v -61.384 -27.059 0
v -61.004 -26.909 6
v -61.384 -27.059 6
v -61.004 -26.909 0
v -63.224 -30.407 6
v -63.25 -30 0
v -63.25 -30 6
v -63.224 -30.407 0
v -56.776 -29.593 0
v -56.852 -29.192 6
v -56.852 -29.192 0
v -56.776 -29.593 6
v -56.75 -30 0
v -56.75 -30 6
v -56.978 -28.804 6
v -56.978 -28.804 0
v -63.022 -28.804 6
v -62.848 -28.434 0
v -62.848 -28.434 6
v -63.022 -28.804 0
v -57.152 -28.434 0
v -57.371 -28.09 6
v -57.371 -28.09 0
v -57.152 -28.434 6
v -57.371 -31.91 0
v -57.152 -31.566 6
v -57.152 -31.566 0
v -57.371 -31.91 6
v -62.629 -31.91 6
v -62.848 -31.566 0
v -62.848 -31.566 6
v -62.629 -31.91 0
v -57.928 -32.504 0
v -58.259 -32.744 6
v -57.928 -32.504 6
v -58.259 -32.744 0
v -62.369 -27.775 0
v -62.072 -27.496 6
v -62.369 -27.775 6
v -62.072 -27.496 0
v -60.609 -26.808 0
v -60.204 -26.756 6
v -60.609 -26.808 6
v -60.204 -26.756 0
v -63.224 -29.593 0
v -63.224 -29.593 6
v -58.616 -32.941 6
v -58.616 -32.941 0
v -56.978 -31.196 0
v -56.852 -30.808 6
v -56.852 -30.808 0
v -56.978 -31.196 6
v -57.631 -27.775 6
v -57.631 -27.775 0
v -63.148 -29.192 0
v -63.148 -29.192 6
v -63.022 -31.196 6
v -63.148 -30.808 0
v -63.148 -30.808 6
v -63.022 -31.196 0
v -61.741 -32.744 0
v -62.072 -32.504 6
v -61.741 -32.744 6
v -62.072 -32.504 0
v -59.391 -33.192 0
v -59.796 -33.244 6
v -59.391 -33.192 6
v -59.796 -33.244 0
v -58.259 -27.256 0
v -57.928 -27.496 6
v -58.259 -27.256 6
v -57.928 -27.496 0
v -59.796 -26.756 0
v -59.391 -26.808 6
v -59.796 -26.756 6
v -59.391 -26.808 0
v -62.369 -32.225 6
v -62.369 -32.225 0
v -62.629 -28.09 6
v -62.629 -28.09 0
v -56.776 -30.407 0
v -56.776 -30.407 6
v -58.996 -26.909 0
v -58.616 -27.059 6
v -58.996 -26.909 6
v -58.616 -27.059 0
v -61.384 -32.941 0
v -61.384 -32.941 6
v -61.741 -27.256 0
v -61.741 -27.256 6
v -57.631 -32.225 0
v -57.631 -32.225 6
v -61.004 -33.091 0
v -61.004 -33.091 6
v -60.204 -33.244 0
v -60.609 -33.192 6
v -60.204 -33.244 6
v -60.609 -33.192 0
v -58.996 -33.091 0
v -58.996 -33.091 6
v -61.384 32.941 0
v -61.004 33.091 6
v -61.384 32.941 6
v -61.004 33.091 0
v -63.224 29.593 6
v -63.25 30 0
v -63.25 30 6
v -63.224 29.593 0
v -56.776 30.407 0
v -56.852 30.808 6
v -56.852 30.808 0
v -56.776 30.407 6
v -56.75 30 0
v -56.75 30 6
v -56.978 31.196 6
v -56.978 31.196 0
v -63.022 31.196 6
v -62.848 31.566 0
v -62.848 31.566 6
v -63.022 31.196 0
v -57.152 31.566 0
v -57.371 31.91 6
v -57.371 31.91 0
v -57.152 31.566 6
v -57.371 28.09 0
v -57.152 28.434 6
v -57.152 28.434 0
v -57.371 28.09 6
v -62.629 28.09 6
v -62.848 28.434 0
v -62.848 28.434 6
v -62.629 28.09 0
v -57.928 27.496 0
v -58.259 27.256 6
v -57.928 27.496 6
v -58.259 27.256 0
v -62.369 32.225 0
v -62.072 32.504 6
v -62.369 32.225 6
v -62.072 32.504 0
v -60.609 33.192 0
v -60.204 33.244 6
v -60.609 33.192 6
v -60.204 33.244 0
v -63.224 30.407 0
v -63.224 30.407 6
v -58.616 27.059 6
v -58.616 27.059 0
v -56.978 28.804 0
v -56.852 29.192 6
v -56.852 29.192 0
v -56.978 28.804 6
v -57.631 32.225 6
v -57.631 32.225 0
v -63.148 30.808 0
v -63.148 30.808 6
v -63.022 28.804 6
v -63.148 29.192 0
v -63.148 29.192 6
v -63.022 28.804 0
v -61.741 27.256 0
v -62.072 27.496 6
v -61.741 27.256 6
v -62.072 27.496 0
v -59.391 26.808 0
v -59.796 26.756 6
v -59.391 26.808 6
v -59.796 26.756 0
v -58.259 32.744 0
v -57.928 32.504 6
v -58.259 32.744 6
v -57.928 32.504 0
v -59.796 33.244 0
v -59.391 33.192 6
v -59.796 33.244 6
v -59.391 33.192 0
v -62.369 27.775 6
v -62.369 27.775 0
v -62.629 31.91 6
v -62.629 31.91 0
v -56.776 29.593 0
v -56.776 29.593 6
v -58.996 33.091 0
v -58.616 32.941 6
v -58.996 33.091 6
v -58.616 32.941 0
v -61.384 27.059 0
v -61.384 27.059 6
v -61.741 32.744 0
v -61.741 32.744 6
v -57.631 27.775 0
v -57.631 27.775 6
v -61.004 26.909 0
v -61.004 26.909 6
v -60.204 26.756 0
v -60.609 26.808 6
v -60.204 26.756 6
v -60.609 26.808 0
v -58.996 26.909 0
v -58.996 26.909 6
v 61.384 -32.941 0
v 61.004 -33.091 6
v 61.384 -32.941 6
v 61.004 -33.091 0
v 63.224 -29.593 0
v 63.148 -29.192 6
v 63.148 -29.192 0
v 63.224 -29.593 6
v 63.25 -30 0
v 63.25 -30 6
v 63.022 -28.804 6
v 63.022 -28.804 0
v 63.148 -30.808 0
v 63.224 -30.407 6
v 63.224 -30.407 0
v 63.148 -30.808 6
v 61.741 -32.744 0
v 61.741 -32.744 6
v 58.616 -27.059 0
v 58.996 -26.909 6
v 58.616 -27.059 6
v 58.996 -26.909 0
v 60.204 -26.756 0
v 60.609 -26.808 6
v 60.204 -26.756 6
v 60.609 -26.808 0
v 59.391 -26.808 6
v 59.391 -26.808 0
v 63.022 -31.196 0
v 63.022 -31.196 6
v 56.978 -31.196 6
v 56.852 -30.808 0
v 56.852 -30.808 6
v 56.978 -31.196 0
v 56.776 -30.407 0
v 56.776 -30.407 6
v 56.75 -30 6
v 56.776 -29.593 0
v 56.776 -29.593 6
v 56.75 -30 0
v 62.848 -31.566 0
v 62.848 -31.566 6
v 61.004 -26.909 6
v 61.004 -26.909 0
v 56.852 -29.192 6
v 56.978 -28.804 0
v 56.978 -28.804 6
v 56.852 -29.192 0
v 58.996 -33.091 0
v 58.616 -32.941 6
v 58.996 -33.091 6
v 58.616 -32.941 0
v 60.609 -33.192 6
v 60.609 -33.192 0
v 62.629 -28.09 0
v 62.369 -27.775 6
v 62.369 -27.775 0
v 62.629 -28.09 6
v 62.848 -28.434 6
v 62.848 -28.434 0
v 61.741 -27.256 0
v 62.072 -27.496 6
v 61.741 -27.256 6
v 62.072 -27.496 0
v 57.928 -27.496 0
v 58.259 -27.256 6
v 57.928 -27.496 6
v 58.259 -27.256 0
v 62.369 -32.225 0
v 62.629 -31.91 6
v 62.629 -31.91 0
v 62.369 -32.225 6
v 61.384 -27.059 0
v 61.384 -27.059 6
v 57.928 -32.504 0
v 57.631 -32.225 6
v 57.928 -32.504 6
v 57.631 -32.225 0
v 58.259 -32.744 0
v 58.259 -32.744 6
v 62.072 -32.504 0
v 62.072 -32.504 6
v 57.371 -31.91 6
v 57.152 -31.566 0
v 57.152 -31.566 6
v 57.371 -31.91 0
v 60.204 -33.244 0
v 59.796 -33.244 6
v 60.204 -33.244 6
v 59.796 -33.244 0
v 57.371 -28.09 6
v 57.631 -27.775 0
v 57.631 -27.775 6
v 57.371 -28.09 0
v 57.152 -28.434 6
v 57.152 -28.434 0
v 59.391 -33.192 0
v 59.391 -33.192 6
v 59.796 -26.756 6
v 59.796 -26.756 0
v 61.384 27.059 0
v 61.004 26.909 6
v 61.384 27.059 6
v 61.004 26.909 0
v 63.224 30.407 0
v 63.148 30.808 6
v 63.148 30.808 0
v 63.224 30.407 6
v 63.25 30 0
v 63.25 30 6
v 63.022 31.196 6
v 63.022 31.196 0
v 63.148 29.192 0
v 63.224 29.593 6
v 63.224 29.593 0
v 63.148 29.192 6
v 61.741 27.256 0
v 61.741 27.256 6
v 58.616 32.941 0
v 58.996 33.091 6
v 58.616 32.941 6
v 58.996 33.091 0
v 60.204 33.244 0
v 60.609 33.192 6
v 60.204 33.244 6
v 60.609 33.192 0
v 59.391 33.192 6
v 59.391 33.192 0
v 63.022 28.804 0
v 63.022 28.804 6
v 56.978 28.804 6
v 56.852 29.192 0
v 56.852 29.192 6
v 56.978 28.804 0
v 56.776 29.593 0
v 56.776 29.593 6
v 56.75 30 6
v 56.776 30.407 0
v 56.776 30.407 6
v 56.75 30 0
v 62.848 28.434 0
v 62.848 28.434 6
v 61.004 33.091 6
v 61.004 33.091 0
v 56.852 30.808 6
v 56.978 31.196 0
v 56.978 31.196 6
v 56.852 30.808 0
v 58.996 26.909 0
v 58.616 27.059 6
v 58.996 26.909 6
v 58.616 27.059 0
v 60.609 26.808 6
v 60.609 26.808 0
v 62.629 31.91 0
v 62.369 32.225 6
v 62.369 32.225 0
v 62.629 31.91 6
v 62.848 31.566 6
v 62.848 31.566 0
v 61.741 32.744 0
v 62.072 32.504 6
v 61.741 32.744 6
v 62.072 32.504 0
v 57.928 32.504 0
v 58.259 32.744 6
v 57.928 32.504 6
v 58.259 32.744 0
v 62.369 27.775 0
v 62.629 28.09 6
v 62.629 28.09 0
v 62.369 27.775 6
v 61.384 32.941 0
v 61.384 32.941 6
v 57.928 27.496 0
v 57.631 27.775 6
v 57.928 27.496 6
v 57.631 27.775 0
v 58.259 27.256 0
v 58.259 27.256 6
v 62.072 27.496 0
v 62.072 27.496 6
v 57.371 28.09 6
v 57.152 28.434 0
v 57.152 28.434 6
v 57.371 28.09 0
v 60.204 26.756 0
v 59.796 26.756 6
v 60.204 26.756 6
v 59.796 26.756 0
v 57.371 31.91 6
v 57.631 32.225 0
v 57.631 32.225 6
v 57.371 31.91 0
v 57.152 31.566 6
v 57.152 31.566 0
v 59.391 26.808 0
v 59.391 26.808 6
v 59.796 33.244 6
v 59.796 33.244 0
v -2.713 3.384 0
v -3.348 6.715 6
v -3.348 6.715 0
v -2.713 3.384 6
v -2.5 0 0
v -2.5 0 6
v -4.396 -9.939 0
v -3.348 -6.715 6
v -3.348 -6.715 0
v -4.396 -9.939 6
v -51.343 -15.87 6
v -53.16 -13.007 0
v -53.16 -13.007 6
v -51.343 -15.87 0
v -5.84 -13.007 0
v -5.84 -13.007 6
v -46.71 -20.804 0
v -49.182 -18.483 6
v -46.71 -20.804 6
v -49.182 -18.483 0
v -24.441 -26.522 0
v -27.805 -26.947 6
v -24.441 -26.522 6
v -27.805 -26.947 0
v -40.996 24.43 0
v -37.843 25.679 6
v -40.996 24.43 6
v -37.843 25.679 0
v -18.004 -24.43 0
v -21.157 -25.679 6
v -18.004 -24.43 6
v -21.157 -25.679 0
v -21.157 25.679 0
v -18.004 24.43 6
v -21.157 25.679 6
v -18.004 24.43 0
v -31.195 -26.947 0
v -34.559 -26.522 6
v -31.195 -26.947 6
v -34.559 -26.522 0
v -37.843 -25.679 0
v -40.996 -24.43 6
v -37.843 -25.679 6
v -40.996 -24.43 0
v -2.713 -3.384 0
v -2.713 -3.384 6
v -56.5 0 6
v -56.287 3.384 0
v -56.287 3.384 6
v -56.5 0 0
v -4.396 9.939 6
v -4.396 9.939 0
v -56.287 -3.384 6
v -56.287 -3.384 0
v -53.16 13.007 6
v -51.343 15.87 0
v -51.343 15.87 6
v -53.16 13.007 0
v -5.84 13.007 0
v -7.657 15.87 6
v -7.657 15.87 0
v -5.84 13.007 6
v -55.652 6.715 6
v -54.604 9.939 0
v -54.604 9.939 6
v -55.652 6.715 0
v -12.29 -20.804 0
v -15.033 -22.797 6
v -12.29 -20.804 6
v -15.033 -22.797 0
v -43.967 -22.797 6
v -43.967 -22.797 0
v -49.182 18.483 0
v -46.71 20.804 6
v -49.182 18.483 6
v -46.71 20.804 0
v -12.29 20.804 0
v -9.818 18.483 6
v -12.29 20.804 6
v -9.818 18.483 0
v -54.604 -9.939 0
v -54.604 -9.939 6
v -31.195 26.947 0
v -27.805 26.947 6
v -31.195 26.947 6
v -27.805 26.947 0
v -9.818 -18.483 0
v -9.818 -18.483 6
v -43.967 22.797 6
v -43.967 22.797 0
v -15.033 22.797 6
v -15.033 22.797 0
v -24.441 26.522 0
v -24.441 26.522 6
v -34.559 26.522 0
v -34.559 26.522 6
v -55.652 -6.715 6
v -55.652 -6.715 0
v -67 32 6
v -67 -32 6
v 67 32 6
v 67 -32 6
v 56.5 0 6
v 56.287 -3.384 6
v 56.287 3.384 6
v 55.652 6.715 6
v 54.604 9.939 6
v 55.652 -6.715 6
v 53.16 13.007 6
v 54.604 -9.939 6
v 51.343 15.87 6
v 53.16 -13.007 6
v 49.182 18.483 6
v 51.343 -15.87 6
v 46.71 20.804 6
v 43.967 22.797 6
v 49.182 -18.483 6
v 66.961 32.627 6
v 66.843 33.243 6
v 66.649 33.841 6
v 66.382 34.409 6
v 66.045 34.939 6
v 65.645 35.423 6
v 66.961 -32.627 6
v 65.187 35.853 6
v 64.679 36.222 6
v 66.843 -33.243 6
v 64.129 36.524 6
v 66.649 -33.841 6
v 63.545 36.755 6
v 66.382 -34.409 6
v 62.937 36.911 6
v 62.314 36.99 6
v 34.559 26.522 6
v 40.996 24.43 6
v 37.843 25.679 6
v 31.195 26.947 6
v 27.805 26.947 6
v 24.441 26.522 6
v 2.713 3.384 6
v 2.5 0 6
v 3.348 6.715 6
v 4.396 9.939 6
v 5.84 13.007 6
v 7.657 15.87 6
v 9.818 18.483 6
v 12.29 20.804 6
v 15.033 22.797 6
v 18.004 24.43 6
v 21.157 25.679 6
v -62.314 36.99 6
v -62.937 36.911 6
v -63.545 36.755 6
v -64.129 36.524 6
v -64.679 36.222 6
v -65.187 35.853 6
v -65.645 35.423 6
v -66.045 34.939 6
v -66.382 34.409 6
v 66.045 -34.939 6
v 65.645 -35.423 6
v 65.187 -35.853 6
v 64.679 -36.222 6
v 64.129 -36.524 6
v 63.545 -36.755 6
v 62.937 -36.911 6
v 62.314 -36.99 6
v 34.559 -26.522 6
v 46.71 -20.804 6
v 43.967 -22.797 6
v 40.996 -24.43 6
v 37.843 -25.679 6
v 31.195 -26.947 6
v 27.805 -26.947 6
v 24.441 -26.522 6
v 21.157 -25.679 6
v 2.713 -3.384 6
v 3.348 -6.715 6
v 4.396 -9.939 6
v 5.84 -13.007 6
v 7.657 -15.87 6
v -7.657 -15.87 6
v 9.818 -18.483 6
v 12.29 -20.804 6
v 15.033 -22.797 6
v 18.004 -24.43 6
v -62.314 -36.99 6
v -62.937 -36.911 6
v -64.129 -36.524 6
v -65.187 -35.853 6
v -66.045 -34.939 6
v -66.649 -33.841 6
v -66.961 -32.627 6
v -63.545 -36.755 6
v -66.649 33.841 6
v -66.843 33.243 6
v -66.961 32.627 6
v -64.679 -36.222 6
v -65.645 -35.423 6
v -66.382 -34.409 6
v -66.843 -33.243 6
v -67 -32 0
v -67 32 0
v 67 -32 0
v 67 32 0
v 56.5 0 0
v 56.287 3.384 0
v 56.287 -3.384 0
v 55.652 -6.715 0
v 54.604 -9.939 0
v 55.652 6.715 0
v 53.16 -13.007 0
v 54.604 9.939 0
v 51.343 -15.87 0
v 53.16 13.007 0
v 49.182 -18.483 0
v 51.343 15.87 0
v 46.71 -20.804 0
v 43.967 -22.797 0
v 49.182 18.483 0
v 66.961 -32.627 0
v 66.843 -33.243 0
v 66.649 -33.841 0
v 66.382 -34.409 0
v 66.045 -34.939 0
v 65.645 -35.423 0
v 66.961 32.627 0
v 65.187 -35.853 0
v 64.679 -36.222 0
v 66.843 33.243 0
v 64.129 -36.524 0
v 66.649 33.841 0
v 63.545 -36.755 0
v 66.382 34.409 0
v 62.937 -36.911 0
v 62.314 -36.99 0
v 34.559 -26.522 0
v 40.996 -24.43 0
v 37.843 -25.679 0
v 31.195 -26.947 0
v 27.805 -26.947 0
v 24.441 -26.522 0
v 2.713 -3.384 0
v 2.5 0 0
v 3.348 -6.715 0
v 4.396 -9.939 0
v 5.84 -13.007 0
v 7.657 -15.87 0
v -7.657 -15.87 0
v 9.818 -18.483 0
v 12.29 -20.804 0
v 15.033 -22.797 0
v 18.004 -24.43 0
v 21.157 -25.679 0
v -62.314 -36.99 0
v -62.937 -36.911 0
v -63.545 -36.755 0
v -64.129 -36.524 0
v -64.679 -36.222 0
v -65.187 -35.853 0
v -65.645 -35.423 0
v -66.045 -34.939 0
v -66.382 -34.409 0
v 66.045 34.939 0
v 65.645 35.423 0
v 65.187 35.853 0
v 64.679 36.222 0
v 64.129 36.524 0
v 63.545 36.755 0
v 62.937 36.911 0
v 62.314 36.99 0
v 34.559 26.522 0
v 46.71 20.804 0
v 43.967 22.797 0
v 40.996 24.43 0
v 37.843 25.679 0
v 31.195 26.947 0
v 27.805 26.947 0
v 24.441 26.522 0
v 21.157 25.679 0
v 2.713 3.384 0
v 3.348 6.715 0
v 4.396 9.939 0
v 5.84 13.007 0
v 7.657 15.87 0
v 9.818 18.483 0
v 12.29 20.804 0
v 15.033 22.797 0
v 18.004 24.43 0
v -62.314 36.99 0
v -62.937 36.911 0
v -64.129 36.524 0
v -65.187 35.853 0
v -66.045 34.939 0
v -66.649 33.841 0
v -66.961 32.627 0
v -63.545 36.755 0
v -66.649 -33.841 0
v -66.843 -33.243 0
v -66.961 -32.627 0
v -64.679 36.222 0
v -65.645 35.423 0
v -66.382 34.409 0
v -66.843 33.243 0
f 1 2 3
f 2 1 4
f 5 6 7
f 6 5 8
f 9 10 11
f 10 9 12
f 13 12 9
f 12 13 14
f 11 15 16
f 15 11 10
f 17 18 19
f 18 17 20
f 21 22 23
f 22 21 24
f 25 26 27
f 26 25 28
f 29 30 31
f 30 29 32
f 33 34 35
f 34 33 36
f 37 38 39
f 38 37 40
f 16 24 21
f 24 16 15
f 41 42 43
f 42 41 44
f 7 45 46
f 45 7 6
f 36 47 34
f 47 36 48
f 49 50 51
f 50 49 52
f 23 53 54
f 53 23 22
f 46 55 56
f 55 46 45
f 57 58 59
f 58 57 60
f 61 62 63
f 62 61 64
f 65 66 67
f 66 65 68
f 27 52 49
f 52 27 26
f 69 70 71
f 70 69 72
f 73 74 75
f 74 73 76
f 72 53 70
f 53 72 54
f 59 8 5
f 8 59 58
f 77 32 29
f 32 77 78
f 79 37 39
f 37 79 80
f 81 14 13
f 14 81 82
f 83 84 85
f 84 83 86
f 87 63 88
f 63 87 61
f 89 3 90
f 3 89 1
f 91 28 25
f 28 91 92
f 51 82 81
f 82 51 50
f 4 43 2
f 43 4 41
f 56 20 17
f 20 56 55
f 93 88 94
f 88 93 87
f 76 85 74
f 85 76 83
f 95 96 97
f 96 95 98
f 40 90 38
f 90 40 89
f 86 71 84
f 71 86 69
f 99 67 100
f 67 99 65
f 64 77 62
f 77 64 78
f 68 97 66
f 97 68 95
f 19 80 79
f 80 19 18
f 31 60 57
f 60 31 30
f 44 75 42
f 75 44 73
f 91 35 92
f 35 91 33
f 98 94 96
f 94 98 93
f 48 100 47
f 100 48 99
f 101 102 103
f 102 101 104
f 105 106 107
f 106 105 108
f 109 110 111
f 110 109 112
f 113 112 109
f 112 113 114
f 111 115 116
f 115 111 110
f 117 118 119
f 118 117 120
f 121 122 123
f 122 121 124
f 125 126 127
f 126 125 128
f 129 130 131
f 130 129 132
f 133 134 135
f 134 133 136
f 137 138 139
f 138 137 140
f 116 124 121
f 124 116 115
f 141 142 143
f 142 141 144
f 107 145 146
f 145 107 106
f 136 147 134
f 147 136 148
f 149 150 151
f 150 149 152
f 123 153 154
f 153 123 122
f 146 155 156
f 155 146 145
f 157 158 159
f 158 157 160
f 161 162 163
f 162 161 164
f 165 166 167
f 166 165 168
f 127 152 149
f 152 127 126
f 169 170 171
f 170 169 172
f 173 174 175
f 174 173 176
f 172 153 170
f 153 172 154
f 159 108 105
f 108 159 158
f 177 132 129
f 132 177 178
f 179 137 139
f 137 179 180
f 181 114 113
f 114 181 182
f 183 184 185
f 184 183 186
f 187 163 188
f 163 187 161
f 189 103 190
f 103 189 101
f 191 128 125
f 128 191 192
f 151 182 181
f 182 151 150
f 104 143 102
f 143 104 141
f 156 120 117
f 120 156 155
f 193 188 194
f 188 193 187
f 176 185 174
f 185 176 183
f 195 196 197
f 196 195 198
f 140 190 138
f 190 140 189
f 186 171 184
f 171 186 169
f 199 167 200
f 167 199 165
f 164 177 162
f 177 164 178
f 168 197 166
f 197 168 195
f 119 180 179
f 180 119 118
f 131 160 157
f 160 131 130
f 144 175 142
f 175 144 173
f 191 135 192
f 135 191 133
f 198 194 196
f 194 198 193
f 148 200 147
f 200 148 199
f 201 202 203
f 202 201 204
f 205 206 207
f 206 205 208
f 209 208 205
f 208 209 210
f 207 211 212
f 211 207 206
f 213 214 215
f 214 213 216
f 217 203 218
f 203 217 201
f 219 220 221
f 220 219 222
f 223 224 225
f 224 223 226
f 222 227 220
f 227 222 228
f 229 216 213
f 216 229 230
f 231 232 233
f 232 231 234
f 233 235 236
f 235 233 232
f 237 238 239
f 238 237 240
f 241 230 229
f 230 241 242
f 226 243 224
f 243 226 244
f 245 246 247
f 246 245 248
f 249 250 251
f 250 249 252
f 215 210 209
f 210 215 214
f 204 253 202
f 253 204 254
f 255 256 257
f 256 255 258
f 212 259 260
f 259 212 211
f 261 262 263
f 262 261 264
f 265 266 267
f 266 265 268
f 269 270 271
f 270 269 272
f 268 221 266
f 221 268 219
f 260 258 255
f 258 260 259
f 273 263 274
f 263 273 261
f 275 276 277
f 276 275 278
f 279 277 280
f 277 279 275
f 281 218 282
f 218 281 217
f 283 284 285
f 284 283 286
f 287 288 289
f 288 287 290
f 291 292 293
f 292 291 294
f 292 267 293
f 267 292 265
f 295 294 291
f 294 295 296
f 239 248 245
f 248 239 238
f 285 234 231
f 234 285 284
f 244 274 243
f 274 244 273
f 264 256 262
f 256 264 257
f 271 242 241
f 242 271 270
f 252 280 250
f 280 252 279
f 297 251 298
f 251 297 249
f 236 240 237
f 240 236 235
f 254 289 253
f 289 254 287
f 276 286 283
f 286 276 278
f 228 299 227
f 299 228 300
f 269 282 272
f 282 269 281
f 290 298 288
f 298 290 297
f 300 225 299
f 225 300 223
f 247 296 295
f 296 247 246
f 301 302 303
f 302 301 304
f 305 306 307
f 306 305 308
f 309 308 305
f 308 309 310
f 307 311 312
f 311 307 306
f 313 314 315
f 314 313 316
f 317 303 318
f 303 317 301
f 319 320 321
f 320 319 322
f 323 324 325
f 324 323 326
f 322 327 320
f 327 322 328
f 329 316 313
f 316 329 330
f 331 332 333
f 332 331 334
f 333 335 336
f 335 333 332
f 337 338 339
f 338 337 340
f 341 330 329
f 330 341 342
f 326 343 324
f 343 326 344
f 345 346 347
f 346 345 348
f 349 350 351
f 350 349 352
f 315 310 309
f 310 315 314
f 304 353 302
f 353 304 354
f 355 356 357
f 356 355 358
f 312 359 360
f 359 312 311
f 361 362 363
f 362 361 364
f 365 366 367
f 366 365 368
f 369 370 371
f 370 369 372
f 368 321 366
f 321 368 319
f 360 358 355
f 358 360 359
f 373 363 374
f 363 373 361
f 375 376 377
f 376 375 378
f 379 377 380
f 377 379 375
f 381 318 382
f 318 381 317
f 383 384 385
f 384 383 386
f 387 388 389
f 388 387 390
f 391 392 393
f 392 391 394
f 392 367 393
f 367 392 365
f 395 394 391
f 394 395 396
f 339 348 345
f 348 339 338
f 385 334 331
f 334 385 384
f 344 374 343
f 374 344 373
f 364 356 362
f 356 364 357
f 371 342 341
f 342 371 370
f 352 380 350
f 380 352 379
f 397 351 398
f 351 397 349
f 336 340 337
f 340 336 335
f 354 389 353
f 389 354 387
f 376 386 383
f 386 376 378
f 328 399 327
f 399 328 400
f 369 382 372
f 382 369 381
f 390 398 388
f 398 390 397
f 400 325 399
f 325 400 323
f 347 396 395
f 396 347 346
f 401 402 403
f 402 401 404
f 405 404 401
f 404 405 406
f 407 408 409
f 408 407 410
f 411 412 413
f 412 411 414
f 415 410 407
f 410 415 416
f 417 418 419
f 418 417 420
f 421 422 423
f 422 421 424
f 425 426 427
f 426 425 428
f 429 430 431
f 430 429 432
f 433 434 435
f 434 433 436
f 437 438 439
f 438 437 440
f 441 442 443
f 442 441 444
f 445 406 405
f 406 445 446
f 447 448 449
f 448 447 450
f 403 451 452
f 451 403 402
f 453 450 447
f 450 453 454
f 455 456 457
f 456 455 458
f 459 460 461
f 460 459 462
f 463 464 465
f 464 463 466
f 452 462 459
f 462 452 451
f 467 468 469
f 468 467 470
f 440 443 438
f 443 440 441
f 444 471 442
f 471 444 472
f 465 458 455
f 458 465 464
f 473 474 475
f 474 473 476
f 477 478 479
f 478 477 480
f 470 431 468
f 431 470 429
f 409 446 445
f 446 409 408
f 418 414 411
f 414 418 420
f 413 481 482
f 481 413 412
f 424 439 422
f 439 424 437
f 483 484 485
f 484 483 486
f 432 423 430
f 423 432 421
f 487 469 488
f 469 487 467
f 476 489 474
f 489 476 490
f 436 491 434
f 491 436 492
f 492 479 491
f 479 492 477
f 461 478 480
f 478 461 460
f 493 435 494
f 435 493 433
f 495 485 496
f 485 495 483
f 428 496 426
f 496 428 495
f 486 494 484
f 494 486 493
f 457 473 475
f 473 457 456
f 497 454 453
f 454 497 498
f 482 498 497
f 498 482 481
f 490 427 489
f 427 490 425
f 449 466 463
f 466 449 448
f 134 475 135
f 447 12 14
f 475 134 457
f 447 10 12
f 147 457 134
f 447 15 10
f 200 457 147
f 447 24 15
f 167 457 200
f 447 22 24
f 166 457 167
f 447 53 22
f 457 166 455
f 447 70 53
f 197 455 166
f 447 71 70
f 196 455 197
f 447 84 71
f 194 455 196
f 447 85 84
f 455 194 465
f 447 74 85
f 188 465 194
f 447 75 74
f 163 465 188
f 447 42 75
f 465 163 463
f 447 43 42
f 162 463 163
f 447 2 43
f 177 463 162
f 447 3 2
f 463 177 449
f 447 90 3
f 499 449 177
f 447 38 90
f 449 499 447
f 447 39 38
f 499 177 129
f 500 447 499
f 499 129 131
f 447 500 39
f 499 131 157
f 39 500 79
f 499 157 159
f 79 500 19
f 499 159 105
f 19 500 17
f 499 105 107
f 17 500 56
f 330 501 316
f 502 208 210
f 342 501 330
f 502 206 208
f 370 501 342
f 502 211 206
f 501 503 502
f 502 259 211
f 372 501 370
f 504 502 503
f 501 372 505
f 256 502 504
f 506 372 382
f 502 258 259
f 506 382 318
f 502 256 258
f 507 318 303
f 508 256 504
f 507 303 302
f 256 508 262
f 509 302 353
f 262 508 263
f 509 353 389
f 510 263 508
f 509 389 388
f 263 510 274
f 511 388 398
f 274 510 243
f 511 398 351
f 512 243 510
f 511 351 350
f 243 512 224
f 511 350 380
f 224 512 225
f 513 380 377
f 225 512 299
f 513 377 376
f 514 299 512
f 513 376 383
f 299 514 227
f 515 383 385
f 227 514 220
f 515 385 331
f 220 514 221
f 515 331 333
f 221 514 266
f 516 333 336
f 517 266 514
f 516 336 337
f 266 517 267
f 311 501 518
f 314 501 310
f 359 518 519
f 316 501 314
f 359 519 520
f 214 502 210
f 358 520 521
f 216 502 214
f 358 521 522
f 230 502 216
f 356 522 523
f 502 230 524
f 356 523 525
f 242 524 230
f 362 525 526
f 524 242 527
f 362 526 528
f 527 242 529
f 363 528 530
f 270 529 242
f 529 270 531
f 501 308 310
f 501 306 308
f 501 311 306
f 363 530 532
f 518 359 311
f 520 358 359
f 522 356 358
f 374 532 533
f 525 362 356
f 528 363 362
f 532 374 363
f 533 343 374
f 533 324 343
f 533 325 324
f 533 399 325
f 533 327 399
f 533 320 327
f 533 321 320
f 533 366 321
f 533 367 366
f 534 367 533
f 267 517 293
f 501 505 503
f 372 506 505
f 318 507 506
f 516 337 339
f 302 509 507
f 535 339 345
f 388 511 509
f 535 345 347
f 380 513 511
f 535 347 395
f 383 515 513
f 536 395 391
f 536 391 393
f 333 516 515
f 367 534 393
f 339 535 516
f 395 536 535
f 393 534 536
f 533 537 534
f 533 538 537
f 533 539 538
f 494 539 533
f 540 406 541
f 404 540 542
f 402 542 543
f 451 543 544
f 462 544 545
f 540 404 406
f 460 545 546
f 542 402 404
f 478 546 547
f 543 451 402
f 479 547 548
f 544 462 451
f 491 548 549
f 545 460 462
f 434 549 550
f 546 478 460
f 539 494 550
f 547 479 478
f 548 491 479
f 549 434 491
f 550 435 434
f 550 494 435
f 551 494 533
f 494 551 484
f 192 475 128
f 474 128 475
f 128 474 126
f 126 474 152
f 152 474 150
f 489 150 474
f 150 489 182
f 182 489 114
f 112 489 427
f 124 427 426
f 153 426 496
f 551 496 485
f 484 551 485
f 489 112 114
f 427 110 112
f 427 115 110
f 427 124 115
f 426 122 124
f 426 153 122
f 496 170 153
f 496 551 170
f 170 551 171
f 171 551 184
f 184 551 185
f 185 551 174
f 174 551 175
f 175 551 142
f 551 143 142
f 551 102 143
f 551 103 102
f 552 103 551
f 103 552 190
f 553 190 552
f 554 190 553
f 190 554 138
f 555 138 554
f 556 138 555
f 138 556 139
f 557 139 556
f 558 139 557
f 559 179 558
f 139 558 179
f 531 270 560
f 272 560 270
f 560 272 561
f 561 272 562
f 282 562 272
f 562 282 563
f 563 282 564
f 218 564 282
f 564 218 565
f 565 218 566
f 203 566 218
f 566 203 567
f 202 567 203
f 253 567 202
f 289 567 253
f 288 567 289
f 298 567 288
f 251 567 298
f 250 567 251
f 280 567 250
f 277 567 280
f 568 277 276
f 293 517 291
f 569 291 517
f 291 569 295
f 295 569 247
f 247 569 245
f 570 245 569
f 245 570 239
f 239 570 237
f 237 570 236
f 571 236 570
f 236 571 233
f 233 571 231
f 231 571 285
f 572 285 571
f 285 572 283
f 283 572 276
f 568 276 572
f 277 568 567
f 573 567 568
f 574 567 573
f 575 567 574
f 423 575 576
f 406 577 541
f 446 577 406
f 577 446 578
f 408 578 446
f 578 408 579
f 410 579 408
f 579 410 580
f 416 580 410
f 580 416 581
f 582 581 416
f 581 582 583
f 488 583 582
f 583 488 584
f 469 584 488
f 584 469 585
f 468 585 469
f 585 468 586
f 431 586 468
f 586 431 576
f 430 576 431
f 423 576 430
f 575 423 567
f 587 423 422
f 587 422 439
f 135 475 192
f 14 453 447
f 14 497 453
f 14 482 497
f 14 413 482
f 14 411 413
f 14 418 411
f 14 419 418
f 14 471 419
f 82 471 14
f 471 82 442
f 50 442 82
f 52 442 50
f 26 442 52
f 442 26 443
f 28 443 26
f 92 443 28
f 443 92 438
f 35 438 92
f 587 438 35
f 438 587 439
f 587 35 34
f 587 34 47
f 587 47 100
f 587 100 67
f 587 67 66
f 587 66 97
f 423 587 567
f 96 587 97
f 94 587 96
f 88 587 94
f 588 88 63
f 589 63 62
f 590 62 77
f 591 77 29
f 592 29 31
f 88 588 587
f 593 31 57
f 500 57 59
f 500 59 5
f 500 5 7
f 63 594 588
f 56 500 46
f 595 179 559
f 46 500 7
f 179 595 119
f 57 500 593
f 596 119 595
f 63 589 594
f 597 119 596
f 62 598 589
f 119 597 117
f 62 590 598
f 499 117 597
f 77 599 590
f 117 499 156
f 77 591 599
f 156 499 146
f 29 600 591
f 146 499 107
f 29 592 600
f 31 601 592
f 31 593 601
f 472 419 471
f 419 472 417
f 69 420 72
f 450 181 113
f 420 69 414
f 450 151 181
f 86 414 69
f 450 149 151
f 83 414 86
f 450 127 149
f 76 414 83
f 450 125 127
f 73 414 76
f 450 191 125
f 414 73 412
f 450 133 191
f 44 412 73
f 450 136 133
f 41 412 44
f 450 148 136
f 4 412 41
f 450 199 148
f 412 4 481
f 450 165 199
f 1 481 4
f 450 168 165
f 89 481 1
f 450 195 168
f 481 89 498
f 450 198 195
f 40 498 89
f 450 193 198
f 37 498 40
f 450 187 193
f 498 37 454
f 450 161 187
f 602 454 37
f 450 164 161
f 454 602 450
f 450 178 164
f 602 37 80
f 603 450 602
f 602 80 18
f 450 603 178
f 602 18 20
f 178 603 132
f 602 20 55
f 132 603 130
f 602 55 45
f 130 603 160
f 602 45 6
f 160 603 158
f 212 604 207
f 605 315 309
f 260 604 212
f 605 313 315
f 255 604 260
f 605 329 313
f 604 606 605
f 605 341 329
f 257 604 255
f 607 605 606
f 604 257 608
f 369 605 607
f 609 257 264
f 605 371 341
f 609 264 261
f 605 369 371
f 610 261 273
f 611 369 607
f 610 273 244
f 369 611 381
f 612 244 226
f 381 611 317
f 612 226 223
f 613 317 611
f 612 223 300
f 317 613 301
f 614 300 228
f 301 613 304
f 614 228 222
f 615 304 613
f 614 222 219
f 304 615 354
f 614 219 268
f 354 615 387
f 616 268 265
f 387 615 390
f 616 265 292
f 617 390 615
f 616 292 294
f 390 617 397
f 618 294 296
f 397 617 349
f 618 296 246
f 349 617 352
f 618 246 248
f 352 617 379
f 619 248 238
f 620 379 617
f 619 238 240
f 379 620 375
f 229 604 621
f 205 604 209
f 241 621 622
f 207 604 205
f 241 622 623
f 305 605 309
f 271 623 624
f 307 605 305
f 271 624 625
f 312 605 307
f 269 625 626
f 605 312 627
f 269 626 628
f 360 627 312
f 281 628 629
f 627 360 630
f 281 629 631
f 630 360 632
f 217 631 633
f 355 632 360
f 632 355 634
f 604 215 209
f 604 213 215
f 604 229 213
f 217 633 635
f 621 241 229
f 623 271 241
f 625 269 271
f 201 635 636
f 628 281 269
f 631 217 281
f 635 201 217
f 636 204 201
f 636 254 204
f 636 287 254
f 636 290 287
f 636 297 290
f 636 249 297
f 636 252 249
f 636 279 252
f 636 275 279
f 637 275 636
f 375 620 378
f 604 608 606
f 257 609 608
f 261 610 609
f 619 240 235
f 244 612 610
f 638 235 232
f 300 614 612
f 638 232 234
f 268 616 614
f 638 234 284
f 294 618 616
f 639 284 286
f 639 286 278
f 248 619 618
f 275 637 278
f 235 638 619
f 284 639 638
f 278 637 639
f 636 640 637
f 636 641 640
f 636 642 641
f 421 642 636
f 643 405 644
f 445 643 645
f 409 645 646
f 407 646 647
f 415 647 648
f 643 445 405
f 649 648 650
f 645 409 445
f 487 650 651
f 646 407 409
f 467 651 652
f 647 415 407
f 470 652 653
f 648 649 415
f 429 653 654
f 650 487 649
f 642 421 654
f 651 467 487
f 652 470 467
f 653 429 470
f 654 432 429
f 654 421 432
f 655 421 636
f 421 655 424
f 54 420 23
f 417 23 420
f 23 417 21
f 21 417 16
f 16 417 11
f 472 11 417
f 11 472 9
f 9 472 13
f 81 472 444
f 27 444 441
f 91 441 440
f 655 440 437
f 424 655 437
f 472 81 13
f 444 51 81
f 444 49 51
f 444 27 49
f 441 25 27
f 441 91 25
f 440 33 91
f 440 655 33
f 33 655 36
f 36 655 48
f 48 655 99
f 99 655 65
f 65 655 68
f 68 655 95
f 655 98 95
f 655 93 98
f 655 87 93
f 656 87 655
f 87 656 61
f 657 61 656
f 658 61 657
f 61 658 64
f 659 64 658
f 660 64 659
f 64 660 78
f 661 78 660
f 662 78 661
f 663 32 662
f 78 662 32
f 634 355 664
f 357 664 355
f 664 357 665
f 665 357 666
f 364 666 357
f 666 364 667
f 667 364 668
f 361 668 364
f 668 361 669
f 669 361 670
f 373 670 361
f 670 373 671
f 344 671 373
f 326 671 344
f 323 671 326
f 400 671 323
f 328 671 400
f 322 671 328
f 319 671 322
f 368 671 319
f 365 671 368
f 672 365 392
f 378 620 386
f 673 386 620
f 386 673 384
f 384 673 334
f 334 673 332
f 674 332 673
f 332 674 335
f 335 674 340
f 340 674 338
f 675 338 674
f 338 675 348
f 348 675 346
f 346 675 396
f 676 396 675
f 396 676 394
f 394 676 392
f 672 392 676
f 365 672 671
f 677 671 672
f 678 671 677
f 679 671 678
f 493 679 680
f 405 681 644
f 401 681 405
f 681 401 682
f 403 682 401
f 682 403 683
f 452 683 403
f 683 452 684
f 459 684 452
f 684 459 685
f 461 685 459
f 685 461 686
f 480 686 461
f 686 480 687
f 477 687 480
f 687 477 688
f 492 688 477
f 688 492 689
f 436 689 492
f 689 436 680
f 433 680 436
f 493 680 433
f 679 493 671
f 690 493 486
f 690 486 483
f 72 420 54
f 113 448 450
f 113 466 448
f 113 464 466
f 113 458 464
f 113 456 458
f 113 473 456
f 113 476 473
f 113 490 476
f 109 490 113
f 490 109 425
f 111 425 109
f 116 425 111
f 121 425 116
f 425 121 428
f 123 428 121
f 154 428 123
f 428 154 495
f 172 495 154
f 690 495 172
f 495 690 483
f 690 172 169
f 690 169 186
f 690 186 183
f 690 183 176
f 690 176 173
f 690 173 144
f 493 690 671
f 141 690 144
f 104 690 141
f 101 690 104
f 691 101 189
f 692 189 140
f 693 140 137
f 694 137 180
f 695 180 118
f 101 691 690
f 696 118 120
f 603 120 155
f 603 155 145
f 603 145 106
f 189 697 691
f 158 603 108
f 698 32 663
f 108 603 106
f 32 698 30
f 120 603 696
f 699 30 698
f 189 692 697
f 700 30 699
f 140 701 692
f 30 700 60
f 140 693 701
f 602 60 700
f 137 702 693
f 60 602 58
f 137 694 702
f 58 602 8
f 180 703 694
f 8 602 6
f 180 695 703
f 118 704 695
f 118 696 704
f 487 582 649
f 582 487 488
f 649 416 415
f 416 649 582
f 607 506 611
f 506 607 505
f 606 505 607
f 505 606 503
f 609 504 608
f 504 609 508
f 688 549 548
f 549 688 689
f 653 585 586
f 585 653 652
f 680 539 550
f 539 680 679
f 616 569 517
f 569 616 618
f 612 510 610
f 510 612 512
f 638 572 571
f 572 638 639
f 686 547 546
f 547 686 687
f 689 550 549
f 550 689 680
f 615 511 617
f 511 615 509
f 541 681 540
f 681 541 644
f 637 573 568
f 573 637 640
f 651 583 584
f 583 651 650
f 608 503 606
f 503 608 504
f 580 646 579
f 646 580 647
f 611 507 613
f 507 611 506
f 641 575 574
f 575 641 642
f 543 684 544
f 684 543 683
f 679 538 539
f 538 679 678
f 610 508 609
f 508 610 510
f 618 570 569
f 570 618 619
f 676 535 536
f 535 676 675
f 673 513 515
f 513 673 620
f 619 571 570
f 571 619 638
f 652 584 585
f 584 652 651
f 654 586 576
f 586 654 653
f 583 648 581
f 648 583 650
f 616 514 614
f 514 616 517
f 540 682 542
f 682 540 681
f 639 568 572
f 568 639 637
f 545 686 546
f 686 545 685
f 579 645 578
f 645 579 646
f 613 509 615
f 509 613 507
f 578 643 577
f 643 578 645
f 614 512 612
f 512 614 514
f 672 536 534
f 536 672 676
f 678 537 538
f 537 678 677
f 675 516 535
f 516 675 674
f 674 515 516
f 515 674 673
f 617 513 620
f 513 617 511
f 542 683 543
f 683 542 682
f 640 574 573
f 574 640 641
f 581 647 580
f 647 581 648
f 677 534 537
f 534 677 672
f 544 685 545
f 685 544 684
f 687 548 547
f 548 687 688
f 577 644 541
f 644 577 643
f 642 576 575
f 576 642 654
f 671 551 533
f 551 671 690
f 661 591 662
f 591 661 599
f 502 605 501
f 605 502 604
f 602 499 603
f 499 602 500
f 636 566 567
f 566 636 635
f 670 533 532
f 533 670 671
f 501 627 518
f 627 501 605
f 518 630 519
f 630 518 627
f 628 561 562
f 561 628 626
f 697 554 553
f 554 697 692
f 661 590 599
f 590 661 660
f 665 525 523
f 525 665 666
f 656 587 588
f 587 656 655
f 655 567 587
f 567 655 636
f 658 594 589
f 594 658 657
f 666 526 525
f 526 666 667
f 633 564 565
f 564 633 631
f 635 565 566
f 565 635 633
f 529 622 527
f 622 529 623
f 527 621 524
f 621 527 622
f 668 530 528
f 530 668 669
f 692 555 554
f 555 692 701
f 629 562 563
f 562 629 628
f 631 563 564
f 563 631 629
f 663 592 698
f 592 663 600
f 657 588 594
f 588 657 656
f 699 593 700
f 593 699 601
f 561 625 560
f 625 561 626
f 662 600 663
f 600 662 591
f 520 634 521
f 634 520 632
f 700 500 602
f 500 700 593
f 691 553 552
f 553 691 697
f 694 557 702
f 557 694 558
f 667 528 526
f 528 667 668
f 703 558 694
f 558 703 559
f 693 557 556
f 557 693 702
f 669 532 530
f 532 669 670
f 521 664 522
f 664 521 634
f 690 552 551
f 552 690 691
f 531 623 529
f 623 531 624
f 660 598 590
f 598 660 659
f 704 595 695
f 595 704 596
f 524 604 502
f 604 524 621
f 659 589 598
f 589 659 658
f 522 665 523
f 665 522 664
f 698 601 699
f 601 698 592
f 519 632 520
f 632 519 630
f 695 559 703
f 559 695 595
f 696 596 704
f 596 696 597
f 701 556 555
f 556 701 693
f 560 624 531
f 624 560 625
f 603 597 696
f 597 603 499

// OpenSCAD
$fn = 50;


difference() {
	union() {
		hull() {
			translate(v = [-62.0000000000, 32.0000000000, 0]) {
				cylinder(h = 6, r = 5);
			}
			translate(v = [62.0000000000, 32.0000000000, 0]) {
				cylinder(h = 6, r = 5);
			}
			translate(v = [-62.0000000000, -32.0000000000, 0]) {
				cylinder(h = 6, r = 5);
			}
			translate(v = [62.0000000000, -32.0000000000, 0]) {
				cylinder(h = 6, r = 5);
			}
		}
	}
	union() {
		#translate(v = [-60.0000000000, -30.0000000000, -100.0000000000]) {
			cylinder(h = 200, r = 3.2500000000);
		}
		#translate(v = [-60.0000000000, 30.0000000000, -100.0000000000]) {
			cylinder(h = 200, r = 3.2500000000);
		}
		#translate(v = [60.0000000000, -30.0000000000, -100.0000000000]) {
			cylinder(h = 200, r = 3.2500000000);
		}
		#translate(v = [60.0000000000, 30.0000000000, -100.0000000000]) {
			cylinder(h = 200, r = 3.2500000000);
		}
		#translate(v = [-29.5000000000, 0, 0]) {
			cylinder(h = 6, r = 27.0000000000);
		}
		#translate(v = [29.5000000000, 0, 0]) {
			cylinder(h = 6, r = 27.0000000000);
		}
	}
}
